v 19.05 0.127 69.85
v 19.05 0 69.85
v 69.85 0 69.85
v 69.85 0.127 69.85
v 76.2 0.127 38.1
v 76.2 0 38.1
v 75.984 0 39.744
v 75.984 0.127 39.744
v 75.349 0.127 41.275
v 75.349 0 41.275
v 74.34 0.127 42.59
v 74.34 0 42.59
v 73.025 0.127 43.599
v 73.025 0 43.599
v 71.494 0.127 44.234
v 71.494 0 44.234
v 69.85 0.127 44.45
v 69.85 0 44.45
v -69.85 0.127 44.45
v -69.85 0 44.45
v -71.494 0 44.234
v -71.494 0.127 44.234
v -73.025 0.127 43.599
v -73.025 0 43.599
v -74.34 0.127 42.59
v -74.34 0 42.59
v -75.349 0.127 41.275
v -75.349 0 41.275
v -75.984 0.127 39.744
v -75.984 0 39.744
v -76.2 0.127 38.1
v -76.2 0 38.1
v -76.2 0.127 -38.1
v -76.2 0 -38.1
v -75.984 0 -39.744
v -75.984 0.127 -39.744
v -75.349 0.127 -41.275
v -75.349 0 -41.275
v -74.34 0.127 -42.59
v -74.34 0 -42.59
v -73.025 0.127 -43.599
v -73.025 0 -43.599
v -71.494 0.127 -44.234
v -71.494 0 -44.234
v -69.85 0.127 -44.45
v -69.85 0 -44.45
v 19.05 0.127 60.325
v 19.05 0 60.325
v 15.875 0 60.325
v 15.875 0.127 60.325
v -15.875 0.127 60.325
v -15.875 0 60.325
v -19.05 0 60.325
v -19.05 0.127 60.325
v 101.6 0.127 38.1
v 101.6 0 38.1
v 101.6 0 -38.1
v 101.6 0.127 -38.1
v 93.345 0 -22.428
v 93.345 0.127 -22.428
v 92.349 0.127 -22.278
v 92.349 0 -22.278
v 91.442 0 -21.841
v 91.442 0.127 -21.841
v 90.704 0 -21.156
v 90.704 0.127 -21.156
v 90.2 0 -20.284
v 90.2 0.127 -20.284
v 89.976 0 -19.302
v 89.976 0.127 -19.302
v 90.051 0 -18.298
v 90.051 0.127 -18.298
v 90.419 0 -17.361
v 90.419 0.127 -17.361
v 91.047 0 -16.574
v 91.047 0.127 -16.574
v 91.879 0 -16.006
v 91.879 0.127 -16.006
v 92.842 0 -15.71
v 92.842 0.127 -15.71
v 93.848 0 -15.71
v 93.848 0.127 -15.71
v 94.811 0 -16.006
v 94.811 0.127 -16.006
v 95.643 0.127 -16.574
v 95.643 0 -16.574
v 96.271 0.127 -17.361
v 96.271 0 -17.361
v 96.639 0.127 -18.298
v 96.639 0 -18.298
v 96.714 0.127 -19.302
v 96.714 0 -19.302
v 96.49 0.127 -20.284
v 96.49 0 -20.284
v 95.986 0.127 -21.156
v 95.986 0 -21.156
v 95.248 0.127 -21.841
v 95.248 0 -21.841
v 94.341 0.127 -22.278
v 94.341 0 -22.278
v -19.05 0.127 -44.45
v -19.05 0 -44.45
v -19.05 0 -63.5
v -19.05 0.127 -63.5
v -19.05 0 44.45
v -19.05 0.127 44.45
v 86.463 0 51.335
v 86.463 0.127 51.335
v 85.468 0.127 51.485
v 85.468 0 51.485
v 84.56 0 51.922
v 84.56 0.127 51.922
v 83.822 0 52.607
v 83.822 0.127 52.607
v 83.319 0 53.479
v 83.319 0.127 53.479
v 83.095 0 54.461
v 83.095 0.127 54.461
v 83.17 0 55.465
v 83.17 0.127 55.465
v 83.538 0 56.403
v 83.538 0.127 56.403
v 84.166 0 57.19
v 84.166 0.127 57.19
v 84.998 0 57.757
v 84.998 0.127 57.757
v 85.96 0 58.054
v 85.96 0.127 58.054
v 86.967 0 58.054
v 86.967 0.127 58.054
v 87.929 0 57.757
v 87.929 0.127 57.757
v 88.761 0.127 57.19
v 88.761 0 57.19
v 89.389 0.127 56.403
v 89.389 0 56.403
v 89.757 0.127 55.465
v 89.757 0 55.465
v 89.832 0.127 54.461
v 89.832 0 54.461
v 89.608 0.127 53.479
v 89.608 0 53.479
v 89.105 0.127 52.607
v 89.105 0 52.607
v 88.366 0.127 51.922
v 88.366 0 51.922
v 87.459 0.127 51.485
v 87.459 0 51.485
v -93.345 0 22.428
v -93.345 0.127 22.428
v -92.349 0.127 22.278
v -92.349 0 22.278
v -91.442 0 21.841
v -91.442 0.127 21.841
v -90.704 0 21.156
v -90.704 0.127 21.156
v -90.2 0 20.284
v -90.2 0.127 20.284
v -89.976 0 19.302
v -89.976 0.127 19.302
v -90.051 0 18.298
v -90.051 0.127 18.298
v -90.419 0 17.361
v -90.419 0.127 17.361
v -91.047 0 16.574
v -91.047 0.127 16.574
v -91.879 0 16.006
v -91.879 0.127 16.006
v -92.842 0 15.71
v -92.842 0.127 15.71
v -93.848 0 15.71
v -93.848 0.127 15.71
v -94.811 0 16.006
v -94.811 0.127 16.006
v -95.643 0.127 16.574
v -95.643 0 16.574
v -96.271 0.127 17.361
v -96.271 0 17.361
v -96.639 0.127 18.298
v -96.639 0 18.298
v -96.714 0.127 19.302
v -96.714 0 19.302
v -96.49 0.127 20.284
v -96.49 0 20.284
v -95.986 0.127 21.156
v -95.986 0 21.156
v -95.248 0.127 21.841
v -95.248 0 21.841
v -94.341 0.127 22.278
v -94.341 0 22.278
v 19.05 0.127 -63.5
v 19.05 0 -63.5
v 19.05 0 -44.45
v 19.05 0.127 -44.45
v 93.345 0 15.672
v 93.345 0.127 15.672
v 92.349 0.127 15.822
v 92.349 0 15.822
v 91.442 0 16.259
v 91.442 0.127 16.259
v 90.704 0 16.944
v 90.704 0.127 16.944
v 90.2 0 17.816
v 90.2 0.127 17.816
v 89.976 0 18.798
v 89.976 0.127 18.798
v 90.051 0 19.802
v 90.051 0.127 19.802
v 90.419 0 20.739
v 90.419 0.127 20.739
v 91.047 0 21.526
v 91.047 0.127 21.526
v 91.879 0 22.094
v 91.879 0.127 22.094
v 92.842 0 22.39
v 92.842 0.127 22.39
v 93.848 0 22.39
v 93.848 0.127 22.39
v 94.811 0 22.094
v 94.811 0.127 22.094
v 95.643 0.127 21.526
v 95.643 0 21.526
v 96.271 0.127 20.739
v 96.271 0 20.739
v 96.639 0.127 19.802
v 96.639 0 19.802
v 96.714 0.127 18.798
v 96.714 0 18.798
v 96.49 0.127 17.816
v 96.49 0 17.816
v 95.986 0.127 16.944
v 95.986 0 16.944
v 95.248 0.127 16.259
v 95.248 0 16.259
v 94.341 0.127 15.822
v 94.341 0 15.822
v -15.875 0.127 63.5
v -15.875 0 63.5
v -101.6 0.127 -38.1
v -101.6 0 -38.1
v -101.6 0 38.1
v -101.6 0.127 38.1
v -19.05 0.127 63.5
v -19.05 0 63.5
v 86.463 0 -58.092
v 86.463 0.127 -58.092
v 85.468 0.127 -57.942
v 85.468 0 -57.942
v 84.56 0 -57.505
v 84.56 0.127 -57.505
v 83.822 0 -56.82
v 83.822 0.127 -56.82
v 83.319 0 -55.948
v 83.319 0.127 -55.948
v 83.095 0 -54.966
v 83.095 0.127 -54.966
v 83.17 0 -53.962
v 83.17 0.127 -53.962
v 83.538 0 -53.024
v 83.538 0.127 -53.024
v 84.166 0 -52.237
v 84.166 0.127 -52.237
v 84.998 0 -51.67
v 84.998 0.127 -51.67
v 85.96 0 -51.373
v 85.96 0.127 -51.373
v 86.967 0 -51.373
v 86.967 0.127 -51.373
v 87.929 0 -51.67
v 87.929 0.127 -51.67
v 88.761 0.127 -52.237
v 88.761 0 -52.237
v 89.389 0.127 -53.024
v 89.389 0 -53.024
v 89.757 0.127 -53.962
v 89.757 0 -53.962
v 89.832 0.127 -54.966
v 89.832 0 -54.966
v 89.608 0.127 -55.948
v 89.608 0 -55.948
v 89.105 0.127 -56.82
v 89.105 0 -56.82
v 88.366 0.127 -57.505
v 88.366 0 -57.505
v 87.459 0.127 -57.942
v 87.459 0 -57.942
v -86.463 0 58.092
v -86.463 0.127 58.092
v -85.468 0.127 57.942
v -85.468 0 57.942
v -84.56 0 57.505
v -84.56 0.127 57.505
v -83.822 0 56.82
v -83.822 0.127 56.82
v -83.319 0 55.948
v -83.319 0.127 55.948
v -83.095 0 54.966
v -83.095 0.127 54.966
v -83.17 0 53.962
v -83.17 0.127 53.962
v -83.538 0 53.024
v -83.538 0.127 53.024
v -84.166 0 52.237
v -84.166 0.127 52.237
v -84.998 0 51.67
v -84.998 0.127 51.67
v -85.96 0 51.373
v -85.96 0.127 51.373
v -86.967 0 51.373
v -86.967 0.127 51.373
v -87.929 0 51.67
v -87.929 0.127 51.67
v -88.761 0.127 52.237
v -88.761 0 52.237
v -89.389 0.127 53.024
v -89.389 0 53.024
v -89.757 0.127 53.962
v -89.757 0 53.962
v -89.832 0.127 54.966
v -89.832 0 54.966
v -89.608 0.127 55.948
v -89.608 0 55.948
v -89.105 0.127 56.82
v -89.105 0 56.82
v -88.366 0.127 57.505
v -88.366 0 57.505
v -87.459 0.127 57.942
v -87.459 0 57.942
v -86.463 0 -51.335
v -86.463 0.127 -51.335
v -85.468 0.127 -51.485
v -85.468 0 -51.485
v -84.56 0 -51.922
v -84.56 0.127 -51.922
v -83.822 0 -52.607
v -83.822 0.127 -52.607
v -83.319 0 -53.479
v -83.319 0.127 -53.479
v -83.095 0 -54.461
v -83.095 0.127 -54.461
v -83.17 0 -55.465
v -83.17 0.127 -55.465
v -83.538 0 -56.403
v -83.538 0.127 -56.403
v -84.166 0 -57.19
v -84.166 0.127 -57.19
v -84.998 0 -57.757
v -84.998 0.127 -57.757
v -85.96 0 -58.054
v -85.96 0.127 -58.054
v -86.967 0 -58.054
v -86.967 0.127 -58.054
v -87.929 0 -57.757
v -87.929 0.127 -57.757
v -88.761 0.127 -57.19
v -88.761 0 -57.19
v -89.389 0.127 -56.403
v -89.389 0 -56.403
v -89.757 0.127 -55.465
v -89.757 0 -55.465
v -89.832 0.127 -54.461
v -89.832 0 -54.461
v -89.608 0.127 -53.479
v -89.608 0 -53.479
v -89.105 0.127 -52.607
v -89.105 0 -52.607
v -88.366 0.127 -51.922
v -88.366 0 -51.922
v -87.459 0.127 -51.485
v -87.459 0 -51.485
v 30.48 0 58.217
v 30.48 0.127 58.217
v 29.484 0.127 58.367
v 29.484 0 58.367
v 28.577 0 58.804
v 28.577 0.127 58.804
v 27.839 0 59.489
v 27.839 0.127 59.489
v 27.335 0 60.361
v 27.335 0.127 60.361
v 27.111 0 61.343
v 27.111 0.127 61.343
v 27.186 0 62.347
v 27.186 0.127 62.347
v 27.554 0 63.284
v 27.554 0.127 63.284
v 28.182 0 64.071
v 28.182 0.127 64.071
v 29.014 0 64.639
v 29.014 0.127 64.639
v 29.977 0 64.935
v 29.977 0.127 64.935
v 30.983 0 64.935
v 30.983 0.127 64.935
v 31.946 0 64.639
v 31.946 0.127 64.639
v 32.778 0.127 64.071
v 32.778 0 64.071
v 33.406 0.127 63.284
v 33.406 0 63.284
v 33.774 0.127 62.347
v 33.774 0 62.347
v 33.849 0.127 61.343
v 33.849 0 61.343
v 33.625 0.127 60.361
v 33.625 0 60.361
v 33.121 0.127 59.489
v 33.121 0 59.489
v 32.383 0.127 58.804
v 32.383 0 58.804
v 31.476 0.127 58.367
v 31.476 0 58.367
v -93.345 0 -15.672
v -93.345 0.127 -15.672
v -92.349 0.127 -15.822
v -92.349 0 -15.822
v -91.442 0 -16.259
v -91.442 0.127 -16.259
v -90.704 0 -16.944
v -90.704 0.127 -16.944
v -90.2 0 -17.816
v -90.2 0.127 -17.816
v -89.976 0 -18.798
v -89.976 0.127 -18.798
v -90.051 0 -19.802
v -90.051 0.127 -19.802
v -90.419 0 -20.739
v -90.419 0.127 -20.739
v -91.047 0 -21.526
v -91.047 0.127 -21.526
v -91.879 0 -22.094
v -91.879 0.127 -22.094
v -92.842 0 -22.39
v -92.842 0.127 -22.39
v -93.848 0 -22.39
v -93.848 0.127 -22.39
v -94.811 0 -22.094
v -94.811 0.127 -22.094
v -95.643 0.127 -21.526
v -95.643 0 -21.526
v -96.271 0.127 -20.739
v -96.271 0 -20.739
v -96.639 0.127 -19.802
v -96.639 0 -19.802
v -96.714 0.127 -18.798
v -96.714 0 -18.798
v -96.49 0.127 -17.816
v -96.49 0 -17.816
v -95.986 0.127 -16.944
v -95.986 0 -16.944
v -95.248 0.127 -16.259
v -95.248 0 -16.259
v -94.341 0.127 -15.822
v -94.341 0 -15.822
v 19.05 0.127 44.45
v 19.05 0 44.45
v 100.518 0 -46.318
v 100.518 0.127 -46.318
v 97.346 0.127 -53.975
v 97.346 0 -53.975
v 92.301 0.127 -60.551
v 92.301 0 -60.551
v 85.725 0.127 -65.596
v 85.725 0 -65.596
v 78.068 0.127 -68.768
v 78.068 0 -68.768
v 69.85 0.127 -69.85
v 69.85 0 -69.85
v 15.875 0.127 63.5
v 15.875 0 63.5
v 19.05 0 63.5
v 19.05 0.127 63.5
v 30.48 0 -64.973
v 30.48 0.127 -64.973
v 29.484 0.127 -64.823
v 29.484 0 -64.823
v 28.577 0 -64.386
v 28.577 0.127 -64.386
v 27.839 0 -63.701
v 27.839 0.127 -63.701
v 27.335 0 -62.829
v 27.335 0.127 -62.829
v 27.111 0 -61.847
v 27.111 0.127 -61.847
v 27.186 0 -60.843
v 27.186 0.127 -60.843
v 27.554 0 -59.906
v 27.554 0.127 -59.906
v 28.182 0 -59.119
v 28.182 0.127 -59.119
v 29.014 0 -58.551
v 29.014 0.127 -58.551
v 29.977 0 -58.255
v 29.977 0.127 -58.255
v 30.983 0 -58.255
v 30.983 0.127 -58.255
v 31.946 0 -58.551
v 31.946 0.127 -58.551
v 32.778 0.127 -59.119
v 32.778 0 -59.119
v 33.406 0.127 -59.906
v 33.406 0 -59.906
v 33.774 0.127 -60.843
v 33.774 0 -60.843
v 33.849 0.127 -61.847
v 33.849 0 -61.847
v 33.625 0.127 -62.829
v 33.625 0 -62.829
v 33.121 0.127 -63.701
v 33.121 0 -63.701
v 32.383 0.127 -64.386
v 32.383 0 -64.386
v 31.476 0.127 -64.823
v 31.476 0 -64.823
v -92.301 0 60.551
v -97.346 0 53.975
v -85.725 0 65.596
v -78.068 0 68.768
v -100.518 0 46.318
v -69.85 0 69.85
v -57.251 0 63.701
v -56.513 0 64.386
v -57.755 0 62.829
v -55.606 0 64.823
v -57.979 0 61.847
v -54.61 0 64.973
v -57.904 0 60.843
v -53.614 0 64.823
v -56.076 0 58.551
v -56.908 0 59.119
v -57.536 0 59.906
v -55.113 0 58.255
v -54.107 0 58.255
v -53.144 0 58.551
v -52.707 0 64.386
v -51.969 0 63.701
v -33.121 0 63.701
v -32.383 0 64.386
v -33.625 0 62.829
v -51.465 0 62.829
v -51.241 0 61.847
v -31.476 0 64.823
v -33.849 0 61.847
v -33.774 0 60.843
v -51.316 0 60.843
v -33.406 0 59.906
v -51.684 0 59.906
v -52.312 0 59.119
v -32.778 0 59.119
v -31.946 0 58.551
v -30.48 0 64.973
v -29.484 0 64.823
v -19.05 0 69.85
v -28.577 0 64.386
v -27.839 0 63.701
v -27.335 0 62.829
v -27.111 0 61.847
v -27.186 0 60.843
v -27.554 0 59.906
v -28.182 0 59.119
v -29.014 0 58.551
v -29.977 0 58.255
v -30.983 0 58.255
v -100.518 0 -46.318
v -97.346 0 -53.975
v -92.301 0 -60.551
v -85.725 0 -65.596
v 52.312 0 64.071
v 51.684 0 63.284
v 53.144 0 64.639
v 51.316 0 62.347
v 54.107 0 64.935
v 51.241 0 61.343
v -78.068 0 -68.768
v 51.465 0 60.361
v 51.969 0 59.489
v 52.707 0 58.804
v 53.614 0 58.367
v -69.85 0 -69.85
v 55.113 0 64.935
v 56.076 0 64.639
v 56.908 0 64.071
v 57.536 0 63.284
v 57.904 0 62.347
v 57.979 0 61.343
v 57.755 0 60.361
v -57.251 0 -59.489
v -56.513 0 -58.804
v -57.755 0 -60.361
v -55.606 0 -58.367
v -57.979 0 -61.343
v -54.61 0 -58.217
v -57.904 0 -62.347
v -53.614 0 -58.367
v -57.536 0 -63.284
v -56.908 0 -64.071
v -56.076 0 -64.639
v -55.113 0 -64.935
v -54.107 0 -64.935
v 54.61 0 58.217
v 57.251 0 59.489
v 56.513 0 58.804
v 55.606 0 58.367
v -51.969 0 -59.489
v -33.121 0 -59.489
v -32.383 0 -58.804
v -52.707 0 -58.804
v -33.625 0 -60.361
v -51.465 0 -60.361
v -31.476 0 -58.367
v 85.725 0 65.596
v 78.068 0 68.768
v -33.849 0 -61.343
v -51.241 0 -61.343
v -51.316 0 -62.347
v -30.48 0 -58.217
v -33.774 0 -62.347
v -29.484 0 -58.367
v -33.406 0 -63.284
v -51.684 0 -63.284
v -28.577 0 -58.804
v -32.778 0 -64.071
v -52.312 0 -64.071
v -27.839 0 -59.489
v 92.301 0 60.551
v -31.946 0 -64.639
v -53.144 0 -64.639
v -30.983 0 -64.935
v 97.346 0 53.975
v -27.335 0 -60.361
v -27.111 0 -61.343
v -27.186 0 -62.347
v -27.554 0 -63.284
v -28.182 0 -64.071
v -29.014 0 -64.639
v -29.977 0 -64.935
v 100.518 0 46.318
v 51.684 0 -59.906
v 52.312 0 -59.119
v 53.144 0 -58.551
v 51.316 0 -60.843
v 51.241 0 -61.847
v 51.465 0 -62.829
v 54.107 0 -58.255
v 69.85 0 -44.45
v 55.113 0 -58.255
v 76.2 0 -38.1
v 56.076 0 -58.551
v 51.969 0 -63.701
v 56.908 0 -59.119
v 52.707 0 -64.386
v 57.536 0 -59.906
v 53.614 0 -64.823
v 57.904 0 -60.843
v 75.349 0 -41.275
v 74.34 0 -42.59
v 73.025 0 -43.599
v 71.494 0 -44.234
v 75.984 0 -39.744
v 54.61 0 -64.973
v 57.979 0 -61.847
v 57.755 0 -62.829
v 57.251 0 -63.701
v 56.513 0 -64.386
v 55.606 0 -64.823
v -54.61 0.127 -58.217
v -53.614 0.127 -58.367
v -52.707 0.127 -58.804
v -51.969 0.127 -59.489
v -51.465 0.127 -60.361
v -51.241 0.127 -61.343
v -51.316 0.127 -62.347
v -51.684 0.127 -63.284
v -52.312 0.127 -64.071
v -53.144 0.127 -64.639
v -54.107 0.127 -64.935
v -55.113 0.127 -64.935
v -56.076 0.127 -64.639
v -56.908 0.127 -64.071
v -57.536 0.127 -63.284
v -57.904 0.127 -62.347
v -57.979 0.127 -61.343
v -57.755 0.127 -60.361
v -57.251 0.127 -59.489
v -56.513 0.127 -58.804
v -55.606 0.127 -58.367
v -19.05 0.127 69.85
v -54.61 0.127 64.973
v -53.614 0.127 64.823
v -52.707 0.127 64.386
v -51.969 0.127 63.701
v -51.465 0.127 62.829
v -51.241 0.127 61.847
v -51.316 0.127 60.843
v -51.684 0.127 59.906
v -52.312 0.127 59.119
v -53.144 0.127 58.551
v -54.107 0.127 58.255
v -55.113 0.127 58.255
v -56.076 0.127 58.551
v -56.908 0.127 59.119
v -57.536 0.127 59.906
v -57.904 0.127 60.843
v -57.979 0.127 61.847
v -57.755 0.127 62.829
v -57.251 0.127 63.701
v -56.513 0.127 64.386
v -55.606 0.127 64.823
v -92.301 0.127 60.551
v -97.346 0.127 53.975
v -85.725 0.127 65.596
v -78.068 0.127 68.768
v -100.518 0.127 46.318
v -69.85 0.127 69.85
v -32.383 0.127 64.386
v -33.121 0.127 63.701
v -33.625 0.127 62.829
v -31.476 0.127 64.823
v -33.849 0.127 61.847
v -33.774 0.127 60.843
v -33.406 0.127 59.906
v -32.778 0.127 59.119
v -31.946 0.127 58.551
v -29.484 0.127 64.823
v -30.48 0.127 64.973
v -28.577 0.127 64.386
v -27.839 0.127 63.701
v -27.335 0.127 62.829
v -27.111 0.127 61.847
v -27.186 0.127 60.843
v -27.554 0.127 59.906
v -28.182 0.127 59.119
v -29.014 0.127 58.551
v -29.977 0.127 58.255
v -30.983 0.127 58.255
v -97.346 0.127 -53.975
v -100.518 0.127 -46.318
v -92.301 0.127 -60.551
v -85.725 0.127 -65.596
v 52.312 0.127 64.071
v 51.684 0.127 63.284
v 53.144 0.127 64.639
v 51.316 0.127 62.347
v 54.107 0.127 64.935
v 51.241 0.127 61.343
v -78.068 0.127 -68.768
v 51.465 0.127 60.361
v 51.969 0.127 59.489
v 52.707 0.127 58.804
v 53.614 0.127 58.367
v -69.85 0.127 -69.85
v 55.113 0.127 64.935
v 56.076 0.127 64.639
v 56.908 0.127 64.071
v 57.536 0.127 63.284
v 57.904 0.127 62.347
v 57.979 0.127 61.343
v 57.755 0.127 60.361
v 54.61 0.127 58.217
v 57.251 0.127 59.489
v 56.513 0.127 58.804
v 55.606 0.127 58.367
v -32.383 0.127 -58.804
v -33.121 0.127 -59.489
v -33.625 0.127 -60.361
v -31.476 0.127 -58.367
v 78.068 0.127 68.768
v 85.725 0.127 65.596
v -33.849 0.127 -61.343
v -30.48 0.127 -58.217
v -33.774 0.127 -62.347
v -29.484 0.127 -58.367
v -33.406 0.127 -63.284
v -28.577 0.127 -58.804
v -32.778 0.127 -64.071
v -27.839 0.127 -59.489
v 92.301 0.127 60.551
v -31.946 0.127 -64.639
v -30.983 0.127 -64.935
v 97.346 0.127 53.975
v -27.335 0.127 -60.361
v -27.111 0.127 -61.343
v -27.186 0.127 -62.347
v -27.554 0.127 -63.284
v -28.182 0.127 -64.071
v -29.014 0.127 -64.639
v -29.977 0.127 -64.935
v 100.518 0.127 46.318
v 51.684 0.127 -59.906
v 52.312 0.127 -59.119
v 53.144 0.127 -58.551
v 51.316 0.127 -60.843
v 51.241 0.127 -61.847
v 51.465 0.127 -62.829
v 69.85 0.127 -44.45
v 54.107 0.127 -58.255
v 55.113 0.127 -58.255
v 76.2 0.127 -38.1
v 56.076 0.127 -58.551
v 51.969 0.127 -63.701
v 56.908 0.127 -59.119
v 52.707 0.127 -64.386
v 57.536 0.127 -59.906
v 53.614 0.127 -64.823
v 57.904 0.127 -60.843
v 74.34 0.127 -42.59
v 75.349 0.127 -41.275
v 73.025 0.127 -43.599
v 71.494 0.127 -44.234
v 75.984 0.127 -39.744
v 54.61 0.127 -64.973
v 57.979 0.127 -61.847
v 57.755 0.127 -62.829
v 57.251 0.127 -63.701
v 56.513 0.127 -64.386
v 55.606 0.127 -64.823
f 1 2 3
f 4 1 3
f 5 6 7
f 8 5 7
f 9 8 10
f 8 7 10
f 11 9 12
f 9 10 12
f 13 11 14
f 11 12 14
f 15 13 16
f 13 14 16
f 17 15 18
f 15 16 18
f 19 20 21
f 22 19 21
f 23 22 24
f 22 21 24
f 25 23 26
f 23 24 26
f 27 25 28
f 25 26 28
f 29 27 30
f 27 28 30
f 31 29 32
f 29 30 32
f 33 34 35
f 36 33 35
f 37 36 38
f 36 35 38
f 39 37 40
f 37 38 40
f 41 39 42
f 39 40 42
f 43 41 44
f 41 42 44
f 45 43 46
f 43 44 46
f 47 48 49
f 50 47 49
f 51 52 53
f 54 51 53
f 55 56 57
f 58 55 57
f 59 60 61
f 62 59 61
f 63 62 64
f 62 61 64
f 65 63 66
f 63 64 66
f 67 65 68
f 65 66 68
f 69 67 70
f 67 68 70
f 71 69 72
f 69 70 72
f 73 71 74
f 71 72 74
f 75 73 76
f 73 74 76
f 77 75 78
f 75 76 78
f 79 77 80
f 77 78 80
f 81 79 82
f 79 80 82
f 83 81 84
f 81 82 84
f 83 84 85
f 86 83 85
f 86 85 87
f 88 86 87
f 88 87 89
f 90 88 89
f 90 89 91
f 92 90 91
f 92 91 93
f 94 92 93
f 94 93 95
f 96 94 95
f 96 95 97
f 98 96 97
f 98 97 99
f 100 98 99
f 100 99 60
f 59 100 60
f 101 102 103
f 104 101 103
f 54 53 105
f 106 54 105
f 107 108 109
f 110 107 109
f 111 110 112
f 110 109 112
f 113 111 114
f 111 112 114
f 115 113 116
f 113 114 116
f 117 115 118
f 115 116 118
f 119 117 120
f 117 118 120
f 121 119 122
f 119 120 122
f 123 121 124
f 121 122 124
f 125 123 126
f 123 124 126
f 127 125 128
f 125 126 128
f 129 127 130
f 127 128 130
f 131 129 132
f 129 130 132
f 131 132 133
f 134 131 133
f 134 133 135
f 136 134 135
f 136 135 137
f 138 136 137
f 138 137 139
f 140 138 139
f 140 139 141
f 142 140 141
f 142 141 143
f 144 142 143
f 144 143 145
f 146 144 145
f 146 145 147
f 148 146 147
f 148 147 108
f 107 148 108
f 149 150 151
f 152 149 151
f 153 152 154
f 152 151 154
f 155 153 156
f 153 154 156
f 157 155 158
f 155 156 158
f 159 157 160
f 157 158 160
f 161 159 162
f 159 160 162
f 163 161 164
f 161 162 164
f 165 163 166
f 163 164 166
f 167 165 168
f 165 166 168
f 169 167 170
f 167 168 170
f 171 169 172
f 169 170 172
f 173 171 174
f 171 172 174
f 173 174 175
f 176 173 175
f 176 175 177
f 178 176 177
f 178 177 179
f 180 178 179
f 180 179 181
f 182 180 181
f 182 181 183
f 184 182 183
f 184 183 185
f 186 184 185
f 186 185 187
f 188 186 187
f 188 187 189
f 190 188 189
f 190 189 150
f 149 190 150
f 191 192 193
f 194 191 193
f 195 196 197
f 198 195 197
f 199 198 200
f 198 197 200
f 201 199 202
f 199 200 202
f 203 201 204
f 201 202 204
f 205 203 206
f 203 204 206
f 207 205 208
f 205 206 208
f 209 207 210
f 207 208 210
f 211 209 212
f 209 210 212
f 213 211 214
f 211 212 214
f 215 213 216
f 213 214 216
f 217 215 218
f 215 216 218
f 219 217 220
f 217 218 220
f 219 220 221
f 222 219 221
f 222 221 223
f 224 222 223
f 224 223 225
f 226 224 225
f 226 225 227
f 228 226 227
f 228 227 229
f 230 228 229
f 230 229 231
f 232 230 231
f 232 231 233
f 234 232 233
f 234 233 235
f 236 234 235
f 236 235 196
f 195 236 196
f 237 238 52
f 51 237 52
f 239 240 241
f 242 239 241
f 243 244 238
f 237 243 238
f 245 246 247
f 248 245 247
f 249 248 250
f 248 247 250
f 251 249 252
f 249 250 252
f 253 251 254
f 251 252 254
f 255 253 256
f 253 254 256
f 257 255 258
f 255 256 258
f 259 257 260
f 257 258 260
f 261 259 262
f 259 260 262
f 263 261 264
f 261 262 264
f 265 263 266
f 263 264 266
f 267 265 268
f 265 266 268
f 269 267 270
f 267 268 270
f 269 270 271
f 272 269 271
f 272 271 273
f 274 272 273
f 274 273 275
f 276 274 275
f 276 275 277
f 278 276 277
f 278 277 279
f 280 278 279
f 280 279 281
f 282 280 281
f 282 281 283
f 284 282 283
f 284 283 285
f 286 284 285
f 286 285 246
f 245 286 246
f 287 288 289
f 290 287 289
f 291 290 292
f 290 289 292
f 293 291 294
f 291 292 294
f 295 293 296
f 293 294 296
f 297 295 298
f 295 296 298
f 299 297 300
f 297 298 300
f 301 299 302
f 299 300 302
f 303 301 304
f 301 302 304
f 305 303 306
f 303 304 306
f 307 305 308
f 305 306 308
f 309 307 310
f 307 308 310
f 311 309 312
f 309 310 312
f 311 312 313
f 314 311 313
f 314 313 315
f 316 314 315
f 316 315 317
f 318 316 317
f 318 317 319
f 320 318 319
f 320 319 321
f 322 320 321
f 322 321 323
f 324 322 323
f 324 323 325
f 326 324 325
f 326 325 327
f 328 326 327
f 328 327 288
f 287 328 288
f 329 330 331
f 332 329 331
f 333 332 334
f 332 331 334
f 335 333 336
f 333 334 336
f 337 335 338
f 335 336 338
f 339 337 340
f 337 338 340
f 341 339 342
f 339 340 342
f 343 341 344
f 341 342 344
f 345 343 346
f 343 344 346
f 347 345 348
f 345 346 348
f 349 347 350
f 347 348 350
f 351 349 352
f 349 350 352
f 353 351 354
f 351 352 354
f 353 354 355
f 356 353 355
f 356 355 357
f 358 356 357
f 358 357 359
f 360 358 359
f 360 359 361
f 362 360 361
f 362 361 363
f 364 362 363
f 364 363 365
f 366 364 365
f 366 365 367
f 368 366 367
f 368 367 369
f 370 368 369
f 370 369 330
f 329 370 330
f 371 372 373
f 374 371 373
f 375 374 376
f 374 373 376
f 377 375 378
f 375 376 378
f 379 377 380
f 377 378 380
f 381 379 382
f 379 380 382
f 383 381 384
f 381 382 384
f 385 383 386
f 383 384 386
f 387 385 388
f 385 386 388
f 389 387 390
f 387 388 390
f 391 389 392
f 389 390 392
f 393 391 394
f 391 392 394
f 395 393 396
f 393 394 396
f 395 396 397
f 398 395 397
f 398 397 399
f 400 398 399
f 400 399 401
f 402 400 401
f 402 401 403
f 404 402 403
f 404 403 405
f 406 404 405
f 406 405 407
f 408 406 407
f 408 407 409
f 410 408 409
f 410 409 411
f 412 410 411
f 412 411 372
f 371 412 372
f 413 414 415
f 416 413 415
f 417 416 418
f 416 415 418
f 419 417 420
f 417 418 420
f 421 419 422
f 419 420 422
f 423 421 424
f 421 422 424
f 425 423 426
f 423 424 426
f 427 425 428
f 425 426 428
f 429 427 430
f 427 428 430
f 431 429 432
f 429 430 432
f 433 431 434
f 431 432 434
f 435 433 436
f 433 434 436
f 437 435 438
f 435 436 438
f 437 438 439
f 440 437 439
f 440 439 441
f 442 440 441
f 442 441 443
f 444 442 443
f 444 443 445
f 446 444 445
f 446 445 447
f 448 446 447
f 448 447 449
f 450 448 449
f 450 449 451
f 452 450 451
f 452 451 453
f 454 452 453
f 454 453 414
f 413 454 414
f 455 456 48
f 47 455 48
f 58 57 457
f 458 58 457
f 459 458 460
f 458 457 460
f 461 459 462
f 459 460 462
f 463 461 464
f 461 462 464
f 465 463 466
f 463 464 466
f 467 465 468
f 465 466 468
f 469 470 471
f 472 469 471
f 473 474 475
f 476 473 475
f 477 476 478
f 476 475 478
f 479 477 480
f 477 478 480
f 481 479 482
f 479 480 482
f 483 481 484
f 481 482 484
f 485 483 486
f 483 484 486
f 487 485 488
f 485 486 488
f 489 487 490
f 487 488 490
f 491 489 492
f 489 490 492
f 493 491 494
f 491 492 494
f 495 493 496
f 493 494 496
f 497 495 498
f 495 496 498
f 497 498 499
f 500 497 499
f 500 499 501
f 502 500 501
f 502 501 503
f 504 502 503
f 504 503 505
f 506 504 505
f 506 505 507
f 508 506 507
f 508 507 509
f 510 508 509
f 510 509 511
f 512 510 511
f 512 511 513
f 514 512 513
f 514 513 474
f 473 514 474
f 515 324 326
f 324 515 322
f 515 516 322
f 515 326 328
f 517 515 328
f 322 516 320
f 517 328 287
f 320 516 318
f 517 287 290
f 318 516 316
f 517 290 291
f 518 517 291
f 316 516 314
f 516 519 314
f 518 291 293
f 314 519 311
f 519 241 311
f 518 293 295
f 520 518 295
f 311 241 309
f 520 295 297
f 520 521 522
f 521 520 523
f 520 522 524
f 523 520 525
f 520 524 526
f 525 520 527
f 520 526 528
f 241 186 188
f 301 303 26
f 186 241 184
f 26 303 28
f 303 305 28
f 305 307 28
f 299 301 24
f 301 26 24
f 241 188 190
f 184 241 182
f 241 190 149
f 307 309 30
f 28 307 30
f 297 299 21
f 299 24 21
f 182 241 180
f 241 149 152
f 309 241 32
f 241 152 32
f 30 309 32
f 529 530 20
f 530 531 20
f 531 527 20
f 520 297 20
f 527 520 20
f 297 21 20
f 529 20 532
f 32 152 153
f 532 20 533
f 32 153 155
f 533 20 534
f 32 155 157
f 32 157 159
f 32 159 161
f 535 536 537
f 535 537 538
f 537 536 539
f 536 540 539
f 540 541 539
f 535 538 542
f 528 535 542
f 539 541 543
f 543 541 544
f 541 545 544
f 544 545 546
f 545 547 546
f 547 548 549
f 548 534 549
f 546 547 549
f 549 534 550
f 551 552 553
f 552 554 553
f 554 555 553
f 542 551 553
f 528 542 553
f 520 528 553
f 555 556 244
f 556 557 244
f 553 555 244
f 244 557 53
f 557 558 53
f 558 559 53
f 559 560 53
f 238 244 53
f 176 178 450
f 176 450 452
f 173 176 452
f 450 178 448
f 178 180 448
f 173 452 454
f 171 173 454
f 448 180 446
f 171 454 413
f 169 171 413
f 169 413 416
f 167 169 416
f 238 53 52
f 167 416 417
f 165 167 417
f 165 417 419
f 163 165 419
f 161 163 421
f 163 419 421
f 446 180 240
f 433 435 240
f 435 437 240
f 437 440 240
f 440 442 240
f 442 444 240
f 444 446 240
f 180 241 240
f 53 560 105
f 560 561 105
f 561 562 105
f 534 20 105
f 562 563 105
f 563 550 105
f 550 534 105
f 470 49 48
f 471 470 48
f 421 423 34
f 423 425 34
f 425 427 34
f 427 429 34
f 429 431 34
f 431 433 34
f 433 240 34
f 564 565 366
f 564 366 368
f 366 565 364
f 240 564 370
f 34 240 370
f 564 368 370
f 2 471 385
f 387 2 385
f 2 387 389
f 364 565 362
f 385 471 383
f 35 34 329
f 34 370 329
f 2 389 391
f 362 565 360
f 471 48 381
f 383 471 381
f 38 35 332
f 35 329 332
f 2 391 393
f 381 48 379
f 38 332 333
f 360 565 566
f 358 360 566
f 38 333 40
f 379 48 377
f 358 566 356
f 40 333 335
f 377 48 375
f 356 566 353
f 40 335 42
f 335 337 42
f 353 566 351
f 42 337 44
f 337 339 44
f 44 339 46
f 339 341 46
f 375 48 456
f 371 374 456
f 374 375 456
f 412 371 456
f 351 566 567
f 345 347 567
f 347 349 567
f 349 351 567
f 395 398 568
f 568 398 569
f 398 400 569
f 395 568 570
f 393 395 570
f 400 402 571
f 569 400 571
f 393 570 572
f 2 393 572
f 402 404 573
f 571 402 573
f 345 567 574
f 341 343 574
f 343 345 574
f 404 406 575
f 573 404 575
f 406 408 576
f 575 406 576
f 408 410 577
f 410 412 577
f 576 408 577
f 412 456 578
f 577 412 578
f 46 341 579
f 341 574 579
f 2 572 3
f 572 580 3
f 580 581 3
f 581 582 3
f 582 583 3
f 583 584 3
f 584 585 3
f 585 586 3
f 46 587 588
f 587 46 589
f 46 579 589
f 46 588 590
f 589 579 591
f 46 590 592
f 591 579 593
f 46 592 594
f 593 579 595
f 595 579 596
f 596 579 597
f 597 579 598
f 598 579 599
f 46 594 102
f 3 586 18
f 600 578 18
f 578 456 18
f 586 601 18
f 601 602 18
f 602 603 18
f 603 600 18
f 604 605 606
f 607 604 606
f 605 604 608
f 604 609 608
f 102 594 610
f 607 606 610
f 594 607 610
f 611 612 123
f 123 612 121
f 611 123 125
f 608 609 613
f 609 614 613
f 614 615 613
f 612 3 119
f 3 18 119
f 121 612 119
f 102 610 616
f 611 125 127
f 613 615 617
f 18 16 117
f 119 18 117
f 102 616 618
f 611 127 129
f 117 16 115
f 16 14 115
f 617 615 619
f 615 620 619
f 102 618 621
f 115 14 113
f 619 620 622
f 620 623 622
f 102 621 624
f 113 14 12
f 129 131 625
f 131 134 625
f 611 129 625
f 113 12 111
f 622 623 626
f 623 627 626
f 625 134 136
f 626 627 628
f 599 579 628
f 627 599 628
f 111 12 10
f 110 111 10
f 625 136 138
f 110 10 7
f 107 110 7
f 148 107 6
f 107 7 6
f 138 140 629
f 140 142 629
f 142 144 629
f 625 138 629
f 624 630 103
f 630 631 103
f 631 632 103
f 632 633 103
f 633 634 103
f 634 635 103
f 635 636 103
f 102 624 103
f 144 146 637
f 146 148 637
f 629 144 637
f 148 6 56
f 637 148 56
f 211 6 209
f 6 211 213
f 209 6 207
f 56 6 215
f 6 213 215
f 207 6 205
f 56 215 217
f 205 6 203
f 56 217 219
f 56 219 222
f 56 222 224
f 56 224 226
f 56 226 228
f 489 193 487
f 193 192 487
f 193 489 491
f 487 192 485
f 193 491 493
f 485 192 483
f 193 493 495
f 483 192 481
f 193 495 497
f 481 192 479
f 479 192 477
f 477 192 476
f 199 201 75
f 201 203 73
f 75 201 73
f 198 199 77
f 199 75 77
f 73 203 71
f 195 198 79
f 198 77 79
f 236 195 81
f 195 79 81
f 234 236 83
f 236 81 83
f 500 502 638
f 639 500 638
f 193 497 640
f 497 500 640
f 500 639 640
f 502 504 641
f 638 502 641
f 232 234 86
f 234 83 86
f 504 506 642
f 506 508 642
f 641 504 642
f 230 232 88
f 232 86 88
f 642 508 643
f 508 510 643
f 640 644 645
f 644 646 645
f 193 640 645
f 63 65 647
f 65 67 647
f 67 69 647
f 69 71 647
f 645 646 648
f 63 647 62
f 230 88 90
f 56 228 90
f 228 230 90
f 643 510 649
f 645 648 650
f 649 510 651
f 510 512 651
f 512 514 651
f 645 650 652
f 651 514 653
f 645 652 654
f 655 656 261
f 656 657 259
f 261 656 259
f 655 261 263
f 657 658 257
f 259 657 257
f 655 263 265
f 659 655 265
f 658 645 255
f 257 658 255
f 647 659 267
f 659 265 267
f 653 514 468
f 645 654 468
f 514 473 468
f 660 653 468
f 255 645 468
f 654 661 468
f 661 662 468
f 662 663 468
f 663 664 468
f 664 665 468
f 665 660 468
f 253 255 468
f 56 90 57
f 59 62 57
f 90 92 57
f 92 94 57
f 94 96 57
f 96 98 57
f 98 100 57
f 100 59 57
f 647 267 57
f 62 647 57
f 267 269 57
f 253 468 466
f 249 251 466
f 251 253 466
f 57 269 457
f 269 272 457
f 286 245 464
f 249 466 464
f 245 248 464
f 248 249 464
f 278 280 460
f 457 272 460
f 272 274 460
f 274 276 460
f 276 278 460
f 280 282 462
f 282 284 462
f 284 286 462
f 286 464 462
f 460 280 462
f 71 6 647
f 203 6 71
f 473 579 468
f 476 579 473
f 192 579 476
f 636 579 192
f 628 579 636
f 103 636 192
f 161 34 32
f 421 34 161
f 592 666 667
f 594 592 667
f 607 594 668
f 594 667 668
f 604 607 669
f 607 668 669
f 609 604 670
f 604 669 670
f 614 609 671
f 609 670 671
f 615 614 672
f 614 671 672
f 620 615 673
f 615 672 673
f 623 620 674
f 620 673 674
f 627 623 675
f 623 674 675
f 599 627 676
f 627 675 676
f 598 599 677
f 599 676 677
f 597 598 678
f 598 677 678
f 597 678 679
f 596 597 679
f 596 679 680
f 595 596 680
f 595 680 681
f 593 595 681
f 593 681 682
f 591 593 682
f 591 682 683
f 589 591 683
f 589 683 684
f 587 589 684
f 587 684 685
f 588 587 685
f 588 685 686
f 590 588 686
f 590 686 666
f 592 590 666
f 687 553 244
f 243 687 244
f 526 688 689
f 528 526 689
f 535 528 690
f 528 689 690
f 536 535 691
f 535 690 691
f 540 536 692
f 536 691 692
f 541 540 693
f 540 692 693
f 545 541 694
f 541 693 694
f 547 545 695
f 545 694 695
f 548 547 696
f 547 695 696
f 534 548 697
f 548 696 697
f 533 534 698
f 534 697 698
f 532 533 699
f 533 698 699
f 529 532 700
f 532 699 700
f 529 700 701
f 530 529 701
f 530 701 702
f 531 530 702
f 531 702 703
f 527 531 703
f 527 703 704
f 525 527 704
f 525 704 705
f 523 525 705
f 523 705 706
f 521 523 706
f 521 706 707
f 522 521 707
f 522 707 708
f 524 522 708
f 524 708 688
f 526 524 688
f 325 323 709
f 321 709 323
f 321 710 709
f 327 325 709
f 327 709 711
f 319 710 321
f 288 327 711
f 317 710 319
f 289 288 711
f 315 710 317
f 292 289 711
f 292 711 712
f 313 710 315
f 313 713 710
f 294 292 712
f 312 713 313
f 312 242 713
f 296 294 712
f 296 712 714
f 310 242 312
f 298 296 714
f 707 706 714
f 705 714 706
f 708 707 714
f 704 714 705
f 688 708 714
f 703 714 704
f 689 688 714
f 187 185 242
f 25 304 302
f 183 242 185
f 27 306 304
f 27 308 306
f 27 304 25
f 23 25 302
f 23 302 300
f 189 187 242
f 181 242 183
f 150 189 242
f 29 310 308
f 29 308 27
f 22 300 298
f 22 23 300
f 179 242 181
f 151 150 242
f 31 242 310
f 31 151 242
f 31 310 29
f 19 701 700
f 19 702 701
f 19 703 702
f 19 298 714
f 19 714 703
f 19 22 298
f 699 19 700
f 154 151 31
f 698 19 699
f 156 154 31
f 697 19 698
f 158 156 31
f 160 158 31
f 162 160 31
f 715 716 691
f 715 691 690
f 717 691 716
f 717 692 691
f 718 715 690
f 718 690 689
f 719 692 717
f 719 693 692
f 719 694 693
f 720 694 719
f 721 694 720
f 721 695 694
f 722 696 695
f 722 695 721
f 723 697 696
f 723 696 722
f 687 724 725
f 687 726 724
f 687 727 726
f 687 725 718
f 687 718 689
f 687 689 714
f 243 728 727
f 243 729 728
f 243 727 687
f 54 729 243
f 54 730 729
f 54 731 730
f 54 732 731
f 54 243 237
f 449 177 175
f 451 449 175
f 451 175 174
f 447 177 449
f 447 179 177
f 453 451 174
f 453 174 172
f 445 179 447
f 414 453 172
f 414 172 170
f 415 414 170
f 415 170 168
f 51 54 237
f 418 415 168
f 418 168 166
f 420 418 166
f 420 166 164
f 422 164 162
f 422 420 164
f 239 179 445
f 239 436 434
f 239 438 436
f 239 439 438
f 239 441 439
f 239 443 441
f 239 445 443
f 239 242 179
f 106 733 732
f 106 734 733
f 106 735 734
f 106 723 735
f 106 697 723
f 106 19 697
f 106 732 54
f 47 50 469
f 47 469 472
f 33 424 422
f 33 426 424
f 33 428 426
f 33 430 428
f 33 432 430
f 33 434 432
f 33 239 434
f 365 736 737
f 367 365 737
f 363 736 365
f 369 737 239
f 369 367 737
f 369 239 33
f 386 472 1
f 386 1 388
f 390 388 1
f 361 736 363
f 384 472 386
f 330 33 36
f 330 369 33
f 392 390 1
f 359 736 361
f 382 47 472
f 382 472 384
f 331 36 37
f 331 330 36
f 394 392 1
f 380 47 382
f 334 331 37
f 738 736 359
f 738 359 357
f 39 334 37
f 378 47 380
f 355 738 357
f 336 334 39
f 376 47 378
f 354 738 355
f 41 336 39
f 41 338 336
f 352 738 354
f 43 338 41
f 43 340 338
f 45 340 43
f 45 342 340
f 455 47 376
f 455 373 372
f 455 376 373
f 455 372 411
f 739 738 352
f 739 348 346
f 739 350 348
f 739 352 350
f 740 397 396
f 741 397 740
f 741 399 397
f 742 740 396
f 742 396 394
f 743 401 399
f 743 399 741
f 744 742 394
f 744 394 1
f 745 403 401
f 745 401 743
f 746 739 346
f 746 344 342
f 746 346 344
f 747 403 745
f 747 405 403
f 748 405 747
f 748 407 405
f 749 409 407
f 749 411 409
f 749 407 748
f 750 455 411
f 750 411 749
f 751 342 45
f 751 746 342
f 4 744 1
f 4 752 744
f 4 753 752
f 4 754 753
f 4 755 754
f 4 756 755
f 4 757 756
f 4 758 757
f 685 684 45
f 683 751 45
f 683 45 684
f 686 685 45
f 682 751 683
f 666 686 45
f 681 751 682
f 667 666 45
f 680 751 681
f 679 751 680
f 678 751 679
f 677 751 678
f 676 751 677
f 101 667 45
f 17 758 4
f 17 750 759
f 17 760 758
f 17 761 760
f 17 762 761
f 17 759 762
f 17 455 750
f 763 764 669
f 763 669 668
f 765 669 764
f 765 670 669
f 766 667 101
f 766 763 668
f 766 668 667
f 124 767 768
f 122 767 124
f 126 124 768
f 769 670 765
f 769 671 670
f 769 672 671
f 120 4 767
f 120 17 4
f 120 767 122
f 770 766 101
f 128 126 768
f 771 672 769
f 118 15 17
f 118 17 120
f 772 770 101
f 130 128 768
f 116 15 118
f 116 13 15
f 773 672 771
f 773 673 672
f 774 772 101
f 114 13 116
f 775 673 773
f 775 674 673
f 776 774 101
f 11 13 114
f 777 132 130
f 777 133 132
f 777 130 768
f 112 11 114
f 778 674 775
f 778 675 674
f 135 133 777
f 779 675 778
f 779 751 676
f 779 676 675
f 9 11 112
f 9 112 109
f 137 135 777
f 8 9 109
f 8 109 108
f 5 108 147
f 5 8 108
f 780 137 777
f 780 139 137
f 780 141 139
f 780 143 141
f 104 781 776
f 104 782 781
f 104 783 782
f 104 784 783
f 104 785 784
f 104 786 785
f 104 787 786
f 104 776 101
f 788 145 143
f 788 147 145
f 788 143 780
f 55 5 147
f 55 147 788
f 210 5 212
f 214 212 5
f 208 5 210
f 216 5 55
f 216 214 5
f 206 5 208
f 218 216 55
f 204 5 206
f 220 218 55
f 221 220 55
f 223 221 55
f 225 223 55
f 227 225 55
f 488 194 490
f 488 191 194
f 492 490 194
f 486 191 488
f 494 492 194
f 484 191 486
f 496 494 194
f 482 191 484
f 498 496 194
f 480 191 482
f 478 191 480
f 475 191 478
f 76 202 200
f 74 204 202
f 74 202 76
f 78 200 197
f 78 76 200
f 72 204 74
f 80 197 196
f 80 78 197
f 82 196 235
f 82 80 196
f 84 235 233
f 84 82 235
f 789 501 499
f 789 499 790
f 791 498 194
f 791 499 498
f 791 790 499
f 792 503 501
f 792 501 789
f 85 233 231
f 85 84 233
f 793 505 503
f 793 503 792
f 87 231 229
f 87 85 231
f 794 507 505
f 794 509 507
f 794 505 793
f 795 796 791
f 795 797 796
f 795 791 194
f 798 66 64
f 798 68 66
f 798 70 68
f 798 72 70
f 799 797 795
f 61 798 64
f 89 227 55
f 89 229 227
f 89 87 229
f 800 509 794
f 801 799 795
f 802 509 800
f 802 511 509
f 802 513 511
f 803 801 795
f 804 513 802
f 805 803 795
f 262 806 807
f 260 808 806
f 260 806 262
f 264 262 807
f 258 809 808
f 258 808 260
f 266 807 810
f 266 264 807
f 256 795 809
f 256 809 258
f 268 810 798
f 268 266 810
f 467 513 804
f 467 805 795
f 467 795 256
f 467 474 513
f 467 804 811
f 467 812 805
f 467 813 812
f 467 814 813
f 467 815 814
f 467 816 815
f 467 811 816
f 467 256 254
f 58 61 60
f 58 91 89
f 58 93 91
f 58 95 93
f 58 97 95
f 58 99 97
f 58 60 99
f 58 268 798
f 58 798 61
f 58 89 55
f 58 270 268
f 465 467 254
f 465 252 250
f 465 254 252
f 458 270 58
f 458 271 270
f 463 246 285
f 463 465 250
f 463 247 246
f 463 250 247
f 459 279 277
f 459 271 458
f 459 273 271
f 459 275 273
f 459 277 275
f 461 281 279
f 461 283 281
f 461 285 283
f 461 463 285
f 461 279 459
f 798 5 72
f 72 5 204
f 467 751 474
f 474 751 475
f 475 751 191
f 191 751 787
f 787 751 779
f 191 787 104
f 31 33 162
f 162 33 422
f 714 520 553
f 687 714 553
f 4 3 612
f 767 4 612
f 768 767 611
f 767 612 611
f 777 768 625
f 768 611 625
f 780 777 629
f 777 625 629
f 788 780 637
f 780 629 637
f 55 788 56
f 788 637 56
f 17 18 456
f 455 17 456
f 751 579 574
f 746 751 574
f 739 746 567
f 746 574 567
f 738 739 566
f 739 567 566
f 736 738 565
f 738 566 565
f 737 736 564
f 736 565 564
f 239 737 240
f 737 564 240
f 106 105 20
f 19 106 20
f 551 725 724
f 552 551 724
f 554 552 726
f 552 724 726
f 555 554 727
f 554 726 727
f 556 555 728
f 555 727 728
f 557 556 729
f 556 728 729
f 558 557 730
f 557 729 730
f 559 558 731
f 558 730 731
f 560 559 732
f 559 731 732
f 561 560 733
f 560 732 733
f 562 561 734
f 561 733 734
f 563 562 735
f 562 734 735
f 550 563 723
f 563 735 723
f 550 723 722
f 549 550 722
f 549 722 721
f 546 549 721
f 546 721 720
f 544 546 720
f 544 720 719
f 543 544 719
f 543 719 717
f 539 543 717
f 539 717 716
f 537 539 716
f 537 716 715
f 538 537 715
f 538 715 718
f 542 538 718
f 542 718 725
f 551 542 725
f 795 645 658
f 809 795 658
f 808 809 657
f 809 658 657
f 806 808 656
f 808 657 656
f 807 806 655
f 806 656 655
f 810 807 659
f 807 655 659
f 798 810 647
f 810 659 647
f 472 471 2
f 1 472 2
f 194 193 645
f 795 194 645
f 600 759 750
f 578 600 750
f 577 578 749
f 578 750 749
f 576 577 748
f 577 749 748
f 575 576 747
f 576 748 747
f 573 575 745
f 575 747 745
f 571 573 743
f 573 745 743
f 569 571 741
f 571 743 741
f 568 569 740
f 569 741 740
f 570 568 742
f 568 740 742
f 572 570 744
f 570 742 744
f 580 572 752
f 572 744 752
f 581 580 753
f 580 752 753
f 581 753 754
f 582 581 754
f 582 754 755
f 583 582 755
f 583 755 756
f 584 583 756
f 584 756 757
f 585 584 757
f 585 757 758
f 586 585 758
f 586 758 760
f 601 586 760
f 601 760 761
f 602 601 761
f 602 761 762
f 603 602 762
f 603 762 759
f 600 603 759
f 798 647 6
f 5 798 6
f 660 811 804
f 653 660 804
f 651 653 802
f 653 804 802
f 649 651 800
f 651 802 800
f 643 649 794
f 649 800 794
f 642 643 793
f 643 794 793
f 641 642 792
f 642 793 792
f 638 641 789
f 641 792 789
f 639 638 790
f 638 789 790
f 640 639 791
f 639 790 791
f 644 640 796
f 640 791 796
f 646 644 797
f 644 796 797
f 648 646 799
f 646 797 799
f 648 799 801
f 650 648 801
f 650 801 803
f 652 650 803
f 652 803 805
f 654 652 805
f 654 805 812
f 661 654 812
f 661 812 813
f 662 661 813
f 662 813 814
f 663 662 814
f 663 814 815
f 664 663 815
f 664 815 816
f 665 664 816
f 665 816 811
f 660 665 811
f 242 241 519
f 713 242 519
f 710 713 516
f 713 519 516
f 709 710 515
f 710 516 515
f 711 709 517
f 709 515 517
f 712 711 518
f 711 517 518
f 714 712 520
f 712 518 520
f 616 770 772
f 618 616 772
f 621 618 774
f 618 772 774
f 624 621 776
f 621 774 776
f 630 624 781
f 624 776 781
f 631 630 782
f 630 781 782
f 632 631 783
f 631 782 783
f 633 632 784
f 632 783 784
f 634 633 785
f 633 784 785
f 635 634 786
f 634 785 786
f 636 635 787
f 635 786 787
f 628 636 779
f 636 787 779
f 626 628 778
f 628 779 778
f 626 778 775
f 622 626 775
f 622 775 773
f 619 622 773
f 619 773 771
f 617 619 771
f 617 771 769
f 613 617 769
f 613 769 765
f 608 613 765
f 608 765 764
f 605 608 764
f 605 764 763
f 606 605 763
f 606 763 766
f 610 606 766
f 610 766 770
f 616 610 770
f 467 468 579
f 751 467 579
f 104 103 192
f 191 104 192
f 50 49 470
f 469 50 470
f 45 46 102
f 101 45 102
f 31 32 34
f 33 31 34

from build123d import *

# Parameters (mm, degrees)
BOSS_EXTRUDE1_DEPTH = 0.127
SKETCH2_R           = 3.3782
CUT_EXTRUDE1_DEPTH  = 124.294763186


with BuildPart() as part:
    # Sketch1 → Boss-Extrude1 (new body)
    with BuildSketch(Plane(origin=(0, 0, 0), x_dir=(1, 0, 0), z_dir=(0, 1, 0))):
        with BuildLine():
            Line((19.05, 44.45), (69.85, 44.45))
            ThreePointArc((69.85, 44.45), (74.340128061, 42.590128061), (76.2, 38.1))
            Line((76.2, 38.1), (76.2, -38.1))
            ThreePointArc((76.2, -38.1), (74.340128061, -42.590128061), (69.85, -44.45))
            Line((69.85, -44.45), (19.05, -44.45))
            Line((19.05, -44.45), (19.05, -60.325))
            Line((19.05, -60.325), (15.875, -60.325))
            Line((15.875, -60.325), (15.875, -63.5))
            Line((15.875, -63.5), (19.05, -63.5))
            Line((19.05, -63.5), (19.05, -69.85))
            Line((19.05, -69.85), (69.85, -69.85))
            ThreePointArc((69.85, -69.85), (92.300640303, -60.550640303), (101.6, -38.1))
            Line((101.6, -38.1), (101.6, 38.1))
            ThreePointArc((101.6, 38.1), (92.300640303, 60.550640303), (69.85, 69.85))
            Line((69.85, 69.85), (-69.85, 69.85))
            ThreePointArc((-69.85, 69.85), (-92.300640303, 60.550640303), (-101.6, 38.1))
            Line((-101.6, 38.1), (-101.6, -38.1))
            ThreePointArc((-101.6, -38.1), (-92.300640303, -60.550640303), (-69.85, -69.85))
            Line((-69.85, -69.85), (-19.05, -69.85))
            Line((-19.05, -69.85), (-19.05, -63.5))
            Line((-19.05, -63.5), (-15.875, -63.5))
            Line((-15.875, -63.5), (-15.875, -60.325))
            Line((-15.875, -60.325), (-19.05, -60.325))
            Line((-19.05, -60.325), (-19.05, -44.45))
            Line((-19.05, -44.45), (-69.85, -44.45))
            ThreePointArc((-69.85, -44.45), (-74.340128061, -42.590128061), (-76.2, -38.1))
            Line((-76.2, -38.1), (-76.2, 38.1))
            ThreePointArc((-76.2, 38.1), (-74.340128061, 42.590128061), (-69.85, 44.45))
            Line((-69.85, 44.45), (-19.05, 44.45))
            Line((-19.05, 44.45), (-19.05, 63.5))
            Line((-19.05, 63.5), (19.05, 63.5))
            Line((19.05, 63.5), (19.05, 44.45))
        make_face()
    extrude(amount=BOSS_EXTRUDE1_DEPTH)

    # Sketch2 → Cut-Extrude1 (cut, through all)
    with BuildSketch(Plane(origin=(0, 0.127, 0), x_dir=(1, 0, 0), z_dir=(0, 1, 0))):
        with Locations(Location((-30.48, 61.595, 0), (0, 0, 270))):
            Circle(SKETCH2_R)
        with Locations(Location((-54.61, 61.595, 0), (0, 0, 270))):
            Circle(SKETCH2_R)
        with Locations(Location((30.48, -61.595, 0), (0, 0, 90))):
            Circle(SKETCH2_R)
        with Locations(Location((54.61, -61.595, 0), (0, 0, 90))):
            Circle(SKETCH2_R)
        with Locations(Location((86.463473824, -54.713473824, 0), (0, 0, 90))):
            Circle(SKETCH2_R)
        with Locations(Location((-86.463473824, 54.713473824, 0), (0, 0, 270))):
            Circle(SKETCH2_R)
        with Locations(Location((-93.345, 19.05, 0), (0, 0, 270))):
            Circle(SKETCH2_R)
        with Locations(Location((-93.345, -19.05, 0), (0, 0, 270))):
            Circle(SKETCH2_R)
        with Locations(Location((93.345, -19.05, 0), (0, 0, 90))):
            Circle(SKETCH2_R)
        with Locations(Location((93.345, 19.05, 0), (0, 0, 90))):
            Circle(SKETCH2_R)
        with Locations(Location((86.463473824, 54.713473824, 0), (0, 0, 90))):
            Circle(SKETCH2_R)
        with Locations(Location((-86.463473824, -54.713473824, 0), (0, 0, 270))):
            Circle(SKETCH2_R)
        with Locations(Location((-54.61, -61.595, 0), (0, 0, 270))):
            Circle(SKETCH2_R)
        with Locations(Location((-30.48, -61.595, 0), (0, 0, 270))):
            Circle(SKETCH2_R)
        with Locations(Location((54.61, 61.595, 0), (0, 0, 90))):
            Circle(SKETCH2_R)
        with Locations(Location((30.48, 61.595, 0), (0, 0, 90))):
            Circle(SKETCH2_R)
    extrude(amount=-CUT_EXTRUDE1_DEPTH, mode=Mode.SUBTRACT)


solid = part.part
